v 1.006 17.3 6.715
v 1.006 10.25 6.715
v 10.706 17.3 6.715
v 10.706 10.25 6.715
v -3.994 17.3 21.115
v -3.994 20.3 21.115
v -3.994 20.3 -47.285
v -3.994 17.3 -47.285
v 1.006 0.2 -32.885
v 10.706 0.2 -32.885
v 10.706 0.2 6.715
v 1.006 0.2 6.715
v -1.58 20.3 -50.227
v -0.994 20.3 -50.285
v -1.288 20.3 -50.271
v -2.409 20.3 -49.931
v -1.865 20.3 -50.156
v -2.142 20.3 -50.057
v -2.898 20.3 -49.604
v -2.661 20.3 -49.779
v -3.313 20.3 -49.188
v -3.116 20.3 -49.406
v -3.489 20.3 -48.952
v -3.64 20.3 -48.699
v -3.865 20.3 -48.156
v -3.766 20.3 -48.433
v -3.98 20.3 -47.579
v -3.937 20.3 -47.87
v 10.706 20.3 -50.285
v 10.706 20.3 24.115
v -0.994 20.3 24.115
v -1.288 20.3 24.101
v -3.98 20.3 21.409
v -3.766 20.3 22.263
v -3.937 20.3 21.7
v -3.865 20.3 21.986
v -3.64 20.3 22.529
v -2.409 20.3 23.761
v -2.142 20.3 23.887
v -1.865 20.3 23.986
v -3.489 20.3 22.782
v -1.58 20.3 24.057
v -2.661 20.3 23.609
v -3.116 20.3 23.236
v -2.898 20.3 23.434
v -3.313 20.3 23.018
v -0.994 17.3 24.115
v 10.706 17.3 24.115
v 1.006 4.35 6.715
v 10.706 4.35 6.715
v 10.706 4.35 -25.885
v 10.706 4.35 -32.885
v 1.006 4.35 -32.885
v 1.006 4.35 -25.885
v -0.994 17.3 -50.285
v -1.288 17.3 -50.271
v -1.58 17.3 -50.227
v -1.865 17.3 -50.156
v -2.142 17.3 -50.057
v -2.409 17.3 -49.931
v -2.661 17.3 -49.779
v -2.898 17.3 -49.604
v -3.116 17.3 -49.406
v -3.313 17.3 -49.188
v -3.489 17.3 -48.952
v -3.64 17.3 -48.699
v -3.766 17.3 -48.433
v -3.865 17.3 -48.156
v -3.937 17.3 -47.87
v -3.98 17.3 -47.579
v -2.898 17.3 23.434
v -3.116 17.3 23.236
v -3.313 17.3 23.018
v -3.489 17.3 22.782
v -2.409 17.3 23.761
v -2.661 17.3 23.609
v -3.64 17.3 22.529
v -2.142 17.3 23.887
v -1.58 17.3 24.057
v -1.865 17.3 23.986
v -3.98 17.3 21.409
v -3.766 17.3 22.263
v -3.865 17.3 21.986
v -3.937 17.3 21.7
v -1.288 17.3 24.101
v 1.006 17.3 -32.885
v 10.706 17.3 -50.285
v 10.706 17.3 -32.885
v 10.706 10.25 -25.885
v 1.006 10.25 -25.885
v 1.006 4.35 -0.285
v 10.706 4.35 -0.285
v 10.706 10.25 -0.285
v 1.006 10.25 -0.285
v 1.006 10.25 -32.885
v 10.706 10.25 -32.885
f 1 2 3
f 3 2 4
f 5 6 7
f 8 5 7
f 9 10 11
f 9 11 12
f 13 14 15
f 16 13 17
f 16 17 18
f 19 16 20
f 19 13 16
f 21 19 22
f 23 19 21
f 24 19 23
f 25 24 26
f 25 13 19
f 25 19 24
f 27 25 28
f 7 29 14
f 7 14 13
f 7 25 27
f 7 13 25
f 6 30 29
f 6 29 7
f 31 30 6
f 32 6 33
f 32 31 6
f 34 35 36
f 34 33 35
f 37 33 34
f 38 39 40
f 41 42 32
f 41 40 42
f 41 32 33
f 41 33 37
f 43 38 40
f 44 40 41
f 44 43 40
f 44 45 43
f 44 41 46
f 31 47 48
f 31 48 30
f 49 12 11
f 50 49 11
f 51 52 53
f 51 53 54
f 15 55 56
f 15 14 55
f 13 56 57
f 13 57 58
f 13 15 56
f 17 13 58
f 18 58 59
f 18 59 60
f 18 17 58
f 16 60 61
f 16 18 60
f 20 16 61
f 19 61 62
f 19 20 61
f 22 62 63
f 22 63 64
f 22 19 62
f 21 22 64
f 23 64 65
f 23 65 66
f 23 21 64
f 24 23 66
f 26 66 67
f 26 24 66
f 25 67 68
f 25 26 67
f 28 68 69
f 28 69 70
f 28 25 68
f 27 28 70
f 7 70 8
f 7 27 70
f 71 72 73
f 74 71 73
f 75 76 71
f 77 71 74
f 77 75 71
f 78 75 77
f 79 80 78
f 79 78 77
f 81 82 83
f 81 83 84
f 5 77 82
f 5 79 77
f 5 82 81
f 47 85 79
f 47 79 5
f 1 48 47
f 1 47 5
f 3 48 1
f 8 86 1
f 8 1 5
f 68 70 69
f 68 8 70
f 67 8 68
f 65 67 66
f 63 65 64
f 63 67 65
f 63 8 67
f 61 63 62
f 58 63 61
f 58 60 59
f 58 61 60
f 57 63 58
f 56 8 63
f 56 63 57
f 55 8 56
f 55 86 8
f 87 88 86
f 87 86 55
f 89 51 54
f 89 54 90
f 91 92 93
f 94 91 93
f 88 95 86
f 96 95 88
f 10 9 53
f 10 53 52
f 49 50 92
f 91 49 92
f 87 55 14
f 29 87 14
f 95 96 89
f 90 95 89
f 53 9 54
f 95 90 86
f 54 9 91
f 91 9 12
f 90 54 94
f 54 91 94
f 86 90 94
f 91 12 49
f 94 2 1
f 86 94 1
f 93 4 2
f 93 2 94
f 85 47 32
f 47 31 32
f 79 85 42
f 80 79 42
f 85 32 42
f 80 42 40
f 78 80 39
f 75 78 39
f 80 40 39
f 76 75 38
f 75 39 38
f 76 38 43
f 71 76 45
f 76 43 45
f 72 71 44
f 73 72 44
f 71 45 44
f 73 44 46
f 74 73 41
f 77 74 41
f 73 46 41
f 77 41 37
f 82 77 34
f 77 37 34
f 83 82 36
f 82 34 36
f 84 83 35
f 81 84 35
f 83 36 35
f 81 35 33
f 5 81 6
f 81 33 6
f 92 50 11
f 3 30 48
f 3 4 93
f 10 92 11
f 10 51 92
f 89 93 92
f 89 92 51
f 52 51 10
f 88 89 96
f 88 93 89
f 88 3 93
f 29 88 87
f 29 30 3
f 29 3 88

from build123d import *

# Parameters (mm, degrees)
BOSS_EXTRUDE1_DEPTH = 15.3
SKETCH4_W           = 7
SKETCH4_H           = 5.9
CUT_EXTRUDE1_DEPTH  = 78.461901488
SKETCH5_W           = 74.8
SKETCH5_H           = 19.8
BOSS_EXTRUDE2_DEPTH = 2
SKETCH6_W           = 74.8
SKETCH6_H           = 3
BOSS_EXTRUDE3_DEPTH = 37.2
SKETCH7_W           = 37.2
SKETCH7_H           = 3
BOSS_EXTRUDE4_DEPTH = 5
FILLET1_R           = 3
BOSS_EXTRUDE5_DEPTH = 23.3
FILLET2_R           = 2
SKETCH10_W          = 74.8
SKETCH10_H          = 19.8
CUT_EXTRUDE2_DEPTH  = 0.2
CUT_EXTRUDE3_DEPTH  = 5
CUT_EXTRUDE3_DRAFT  = 30
BOSS_EXTRUDE6_DEPTH = 15
CUT_EXTRUDE4_START  = -80.1
SKETCH15_W          = 92.424256673
SKETCH15_H          = 46.662169566
CUT_EXTRUDE4_DEPTH  = 80.1


with BuildPart() as part:
    # Sketch1 → Boss-Extrude1 (new body)
    with BuildSketch(Plane(origin=(0, 0, 0), x_dir=(1, 0, 0), z_dir=(0, 1, 0))):
        with BuildLine():
            Line((1.005677457, 13.08496015), (1.005677457, -6.71503985))
            Line((1.005677457, -6.71503985), (10.705677457, -6.71503985))
            Line((10.705677457, -6.71503985), (10.705677457, 7.68496015))
            ThreePointArc((10.705677457, 7.68496015), (24.690281417, 4.453424809), (33.705677457, -6.71503985))
            Line((33.705677457, -6.71503985), (75.805677457, -6.71503985))
            Line((75.805677457, -6.71503985), (75.805677457, 13.08496015))
            Line((75.805677457, 13.08496015), (1.005677457, 13.08496015))
        make_face()
    extrude(amount=BOSS_EXTRUDE1_DEPTH)

    # Sketch4 → Cut-Extrude1 (cut, through all)
    with BuildSketch(Plane(origin=(75.805677457, 0, 0), x_dir=(0, 0, -1), z_dir=(1, 0, 0))):
        with Locations((-3.21503985, 7.3)):
            Rectangle(SKETCH4_W, SKETCH4_H)
    extrude(amount=-CUT_EXTRUDE1_DEPTH, mode=Mode.SUBTRACT)

    # Sketch5 → Boss-Extrude2 (add)
    with BuildSketch(Plane(origin=(0, 15.3, 0), x_dir=(1, 0, 0), z_dir=(0, 1, 0))):
        with Locations((38.405677457, 3.18496015)):
            Rectangle(SKETCH5_W, SKETCH5_H)
    extrude(amount=BOSS_EXTRUDE2_DEPTH)

    # Sketch6 → Boss-Extrude3 (add)
    with BuildSketch(Plane(origin=(0, 0, -13.08496015), x_dir=(-1, 0, 0), z_dir=(0, 0, -1))):
        with Locations((-38.405677457, 18.8)):
            Rectangle(SKETCH6_W, SKETCH6_H)
    extrude(amount=-BOSS_EXTRUDE3_DEPTH)

    # Sketch7 → Boss-Extrude4 (add)
    with BuildSketch(Plane.ZY.offset(-1.005677457)):
        with Locations((5.51503985, 18.8)):
            Rectangle(SKETCH7_W, SKETCH7_H)
    extrude(amount=BOSS_EXTRUDE4_DEPTH)

    # Fillet1
    fillet1_edges = [part.edges().sort_by_distance(p)[0] for p in [
        (-3.994322543, 18.8, 24.11503985),
    ]]
    fillet(fillet1_edges, radius=FILLET1_R)

    # Sketch8 → Boss-Extrude5 (add)
    with BuildSketch(Plane(origin=(0, 20.3, 0), x_dir=(1, 0, 0), z_dir=(0, 1, 0))):
        with BuildLine():
            Line((75.805677457, 13.08496015), (90.805677457, 13.08496015))
            Line((90.805677457, 13.08496015), (90.805677457, -3.072659154))
            ThreePointArc((90.805677457, -3.072659154), (86.671822493, -15.993396221), (75.805677457, -24.11503985))
            Line((75.805677457, -24.11503985), (75.805677457, 13.08496015))
        make_face()
    extrude(amount=-BOSS_EXTRUDE5_DEPTH)

    # Fillet2
    fillet2_edges = [part.edges().sort_by_distance(p)[0] for p in [
        (90.805677457, -3, -5.006150498),
        (86.671822493, -3, 15.993396221),
    ]]
    fillet(fillet2_edges, radius=FILLET2_R)

    # Sketch10 → Cut-Extrude2 (cut)
    with BuildSketch(Plane(origin=(0, 0, 0), x_dir=(-1, 0, 0), z_dir=(0, -1, 0))):
        with Locations((-38.405677457, 3.18496015)):
            Rectangle(SKETCH10_W, SKETCH10_H)
    extrude(amount=-CUT_EXTRUDE2_DEPTH, mode=Mode.SUBTRACT)


with BuildPart() as cut_extrude3_tool:
    # Sketch11 → Cut-Extrude3 (with draft: the straight prism first)
    with BuildSketch(Plane(origin=(0, -3, 0), x_dir=(-1, 0, 0), z_dir=(0, -1, 0))):
        with BuildLine():
            Line((-75.805677457, 13.08496015), (-83.305677457, 13.08496015))
            Line((-83.305677457, 13.08496015), (-83.305677457, 8.08496015))
            ThreePointArc((-83.305677457, 8.08496015), (-80.312616551, 4.449551508), (-75.805677457, 3.08496015))
            Line((-75.805677457, 3.08496015), (-75.805677457, 13.08496015))
        make_face()
    extrude(amount=-CUT_EXTRUDE3_DEPTH)
    # Cut-Extrude3: the draft: its side faces are tilted about the plane it starts from
    cut_extrude3_sides = [cut_extrude3_tool.faces().sort_by_distance(p)[0] for p in [
        (75.805677457, -0.5, -8.08496015),
        (79.555677457, -0.5, -13.08496015),
        (83.305677457, -0.5, -10.58496015),
        (80.312616551, -0.5, -4.449551508),
    ]]
    draft(cut_extrude3_sides, Plane(origin=(0, -3, 0), x_dir=(-1, 0, 0), z_dir=(0, -1, 0)), CUT_EXTRUDE3_DRAFT)


with BuildPart() as part_1:
    add(part.part)

    # Cut-Extrude3: cut by cut_extrude3_tool
    add(cut_extrude3_tool.part, mode=Mode.SUBTRACT)

    # Sketch14 → Boss-Extrude6 (add)
    with BuildSketch(Plane(origin=(0, 0, -13.08496015), x_dir=(-1, 0, 0), z_dir=(0, 0, -1))):
        Polygon((-72.918926111, 2), (-73.958156595, 0.2), (-75.805677457, 0.2), (-75.805677457, 2), align=None)
    extrude(amount=-BOSS_EXTRUDE6_DEPTH)

    # Mirror1: part across plane


with BuildPart() as part_2:
    add(part_1.part)
    add(part_1.part.mirror(Plane(origin=(0, 15.3, -13.08496015), x_dir=(1, 0, 0), z_dir=(0, 0, -1))))

    # Sketch15 → Cut-Extrude4 (cut)
    with BuildSketch(Plane(origin=(90.805677457, 0, 0), x_dir=(0, 0, -1), z_dir=(1, 0, 0)).offset(CUT_EXTRUDE4_START)):
        with Locations((15.406225438, 7.825251121)):
            Rectangle(SKETCH15_W, SKETCH15_H)
    extrude(amount=CUT_EXTRUDE4_DEPTH, mode=Mode.SUBTRACT)


solid = part_2.part
